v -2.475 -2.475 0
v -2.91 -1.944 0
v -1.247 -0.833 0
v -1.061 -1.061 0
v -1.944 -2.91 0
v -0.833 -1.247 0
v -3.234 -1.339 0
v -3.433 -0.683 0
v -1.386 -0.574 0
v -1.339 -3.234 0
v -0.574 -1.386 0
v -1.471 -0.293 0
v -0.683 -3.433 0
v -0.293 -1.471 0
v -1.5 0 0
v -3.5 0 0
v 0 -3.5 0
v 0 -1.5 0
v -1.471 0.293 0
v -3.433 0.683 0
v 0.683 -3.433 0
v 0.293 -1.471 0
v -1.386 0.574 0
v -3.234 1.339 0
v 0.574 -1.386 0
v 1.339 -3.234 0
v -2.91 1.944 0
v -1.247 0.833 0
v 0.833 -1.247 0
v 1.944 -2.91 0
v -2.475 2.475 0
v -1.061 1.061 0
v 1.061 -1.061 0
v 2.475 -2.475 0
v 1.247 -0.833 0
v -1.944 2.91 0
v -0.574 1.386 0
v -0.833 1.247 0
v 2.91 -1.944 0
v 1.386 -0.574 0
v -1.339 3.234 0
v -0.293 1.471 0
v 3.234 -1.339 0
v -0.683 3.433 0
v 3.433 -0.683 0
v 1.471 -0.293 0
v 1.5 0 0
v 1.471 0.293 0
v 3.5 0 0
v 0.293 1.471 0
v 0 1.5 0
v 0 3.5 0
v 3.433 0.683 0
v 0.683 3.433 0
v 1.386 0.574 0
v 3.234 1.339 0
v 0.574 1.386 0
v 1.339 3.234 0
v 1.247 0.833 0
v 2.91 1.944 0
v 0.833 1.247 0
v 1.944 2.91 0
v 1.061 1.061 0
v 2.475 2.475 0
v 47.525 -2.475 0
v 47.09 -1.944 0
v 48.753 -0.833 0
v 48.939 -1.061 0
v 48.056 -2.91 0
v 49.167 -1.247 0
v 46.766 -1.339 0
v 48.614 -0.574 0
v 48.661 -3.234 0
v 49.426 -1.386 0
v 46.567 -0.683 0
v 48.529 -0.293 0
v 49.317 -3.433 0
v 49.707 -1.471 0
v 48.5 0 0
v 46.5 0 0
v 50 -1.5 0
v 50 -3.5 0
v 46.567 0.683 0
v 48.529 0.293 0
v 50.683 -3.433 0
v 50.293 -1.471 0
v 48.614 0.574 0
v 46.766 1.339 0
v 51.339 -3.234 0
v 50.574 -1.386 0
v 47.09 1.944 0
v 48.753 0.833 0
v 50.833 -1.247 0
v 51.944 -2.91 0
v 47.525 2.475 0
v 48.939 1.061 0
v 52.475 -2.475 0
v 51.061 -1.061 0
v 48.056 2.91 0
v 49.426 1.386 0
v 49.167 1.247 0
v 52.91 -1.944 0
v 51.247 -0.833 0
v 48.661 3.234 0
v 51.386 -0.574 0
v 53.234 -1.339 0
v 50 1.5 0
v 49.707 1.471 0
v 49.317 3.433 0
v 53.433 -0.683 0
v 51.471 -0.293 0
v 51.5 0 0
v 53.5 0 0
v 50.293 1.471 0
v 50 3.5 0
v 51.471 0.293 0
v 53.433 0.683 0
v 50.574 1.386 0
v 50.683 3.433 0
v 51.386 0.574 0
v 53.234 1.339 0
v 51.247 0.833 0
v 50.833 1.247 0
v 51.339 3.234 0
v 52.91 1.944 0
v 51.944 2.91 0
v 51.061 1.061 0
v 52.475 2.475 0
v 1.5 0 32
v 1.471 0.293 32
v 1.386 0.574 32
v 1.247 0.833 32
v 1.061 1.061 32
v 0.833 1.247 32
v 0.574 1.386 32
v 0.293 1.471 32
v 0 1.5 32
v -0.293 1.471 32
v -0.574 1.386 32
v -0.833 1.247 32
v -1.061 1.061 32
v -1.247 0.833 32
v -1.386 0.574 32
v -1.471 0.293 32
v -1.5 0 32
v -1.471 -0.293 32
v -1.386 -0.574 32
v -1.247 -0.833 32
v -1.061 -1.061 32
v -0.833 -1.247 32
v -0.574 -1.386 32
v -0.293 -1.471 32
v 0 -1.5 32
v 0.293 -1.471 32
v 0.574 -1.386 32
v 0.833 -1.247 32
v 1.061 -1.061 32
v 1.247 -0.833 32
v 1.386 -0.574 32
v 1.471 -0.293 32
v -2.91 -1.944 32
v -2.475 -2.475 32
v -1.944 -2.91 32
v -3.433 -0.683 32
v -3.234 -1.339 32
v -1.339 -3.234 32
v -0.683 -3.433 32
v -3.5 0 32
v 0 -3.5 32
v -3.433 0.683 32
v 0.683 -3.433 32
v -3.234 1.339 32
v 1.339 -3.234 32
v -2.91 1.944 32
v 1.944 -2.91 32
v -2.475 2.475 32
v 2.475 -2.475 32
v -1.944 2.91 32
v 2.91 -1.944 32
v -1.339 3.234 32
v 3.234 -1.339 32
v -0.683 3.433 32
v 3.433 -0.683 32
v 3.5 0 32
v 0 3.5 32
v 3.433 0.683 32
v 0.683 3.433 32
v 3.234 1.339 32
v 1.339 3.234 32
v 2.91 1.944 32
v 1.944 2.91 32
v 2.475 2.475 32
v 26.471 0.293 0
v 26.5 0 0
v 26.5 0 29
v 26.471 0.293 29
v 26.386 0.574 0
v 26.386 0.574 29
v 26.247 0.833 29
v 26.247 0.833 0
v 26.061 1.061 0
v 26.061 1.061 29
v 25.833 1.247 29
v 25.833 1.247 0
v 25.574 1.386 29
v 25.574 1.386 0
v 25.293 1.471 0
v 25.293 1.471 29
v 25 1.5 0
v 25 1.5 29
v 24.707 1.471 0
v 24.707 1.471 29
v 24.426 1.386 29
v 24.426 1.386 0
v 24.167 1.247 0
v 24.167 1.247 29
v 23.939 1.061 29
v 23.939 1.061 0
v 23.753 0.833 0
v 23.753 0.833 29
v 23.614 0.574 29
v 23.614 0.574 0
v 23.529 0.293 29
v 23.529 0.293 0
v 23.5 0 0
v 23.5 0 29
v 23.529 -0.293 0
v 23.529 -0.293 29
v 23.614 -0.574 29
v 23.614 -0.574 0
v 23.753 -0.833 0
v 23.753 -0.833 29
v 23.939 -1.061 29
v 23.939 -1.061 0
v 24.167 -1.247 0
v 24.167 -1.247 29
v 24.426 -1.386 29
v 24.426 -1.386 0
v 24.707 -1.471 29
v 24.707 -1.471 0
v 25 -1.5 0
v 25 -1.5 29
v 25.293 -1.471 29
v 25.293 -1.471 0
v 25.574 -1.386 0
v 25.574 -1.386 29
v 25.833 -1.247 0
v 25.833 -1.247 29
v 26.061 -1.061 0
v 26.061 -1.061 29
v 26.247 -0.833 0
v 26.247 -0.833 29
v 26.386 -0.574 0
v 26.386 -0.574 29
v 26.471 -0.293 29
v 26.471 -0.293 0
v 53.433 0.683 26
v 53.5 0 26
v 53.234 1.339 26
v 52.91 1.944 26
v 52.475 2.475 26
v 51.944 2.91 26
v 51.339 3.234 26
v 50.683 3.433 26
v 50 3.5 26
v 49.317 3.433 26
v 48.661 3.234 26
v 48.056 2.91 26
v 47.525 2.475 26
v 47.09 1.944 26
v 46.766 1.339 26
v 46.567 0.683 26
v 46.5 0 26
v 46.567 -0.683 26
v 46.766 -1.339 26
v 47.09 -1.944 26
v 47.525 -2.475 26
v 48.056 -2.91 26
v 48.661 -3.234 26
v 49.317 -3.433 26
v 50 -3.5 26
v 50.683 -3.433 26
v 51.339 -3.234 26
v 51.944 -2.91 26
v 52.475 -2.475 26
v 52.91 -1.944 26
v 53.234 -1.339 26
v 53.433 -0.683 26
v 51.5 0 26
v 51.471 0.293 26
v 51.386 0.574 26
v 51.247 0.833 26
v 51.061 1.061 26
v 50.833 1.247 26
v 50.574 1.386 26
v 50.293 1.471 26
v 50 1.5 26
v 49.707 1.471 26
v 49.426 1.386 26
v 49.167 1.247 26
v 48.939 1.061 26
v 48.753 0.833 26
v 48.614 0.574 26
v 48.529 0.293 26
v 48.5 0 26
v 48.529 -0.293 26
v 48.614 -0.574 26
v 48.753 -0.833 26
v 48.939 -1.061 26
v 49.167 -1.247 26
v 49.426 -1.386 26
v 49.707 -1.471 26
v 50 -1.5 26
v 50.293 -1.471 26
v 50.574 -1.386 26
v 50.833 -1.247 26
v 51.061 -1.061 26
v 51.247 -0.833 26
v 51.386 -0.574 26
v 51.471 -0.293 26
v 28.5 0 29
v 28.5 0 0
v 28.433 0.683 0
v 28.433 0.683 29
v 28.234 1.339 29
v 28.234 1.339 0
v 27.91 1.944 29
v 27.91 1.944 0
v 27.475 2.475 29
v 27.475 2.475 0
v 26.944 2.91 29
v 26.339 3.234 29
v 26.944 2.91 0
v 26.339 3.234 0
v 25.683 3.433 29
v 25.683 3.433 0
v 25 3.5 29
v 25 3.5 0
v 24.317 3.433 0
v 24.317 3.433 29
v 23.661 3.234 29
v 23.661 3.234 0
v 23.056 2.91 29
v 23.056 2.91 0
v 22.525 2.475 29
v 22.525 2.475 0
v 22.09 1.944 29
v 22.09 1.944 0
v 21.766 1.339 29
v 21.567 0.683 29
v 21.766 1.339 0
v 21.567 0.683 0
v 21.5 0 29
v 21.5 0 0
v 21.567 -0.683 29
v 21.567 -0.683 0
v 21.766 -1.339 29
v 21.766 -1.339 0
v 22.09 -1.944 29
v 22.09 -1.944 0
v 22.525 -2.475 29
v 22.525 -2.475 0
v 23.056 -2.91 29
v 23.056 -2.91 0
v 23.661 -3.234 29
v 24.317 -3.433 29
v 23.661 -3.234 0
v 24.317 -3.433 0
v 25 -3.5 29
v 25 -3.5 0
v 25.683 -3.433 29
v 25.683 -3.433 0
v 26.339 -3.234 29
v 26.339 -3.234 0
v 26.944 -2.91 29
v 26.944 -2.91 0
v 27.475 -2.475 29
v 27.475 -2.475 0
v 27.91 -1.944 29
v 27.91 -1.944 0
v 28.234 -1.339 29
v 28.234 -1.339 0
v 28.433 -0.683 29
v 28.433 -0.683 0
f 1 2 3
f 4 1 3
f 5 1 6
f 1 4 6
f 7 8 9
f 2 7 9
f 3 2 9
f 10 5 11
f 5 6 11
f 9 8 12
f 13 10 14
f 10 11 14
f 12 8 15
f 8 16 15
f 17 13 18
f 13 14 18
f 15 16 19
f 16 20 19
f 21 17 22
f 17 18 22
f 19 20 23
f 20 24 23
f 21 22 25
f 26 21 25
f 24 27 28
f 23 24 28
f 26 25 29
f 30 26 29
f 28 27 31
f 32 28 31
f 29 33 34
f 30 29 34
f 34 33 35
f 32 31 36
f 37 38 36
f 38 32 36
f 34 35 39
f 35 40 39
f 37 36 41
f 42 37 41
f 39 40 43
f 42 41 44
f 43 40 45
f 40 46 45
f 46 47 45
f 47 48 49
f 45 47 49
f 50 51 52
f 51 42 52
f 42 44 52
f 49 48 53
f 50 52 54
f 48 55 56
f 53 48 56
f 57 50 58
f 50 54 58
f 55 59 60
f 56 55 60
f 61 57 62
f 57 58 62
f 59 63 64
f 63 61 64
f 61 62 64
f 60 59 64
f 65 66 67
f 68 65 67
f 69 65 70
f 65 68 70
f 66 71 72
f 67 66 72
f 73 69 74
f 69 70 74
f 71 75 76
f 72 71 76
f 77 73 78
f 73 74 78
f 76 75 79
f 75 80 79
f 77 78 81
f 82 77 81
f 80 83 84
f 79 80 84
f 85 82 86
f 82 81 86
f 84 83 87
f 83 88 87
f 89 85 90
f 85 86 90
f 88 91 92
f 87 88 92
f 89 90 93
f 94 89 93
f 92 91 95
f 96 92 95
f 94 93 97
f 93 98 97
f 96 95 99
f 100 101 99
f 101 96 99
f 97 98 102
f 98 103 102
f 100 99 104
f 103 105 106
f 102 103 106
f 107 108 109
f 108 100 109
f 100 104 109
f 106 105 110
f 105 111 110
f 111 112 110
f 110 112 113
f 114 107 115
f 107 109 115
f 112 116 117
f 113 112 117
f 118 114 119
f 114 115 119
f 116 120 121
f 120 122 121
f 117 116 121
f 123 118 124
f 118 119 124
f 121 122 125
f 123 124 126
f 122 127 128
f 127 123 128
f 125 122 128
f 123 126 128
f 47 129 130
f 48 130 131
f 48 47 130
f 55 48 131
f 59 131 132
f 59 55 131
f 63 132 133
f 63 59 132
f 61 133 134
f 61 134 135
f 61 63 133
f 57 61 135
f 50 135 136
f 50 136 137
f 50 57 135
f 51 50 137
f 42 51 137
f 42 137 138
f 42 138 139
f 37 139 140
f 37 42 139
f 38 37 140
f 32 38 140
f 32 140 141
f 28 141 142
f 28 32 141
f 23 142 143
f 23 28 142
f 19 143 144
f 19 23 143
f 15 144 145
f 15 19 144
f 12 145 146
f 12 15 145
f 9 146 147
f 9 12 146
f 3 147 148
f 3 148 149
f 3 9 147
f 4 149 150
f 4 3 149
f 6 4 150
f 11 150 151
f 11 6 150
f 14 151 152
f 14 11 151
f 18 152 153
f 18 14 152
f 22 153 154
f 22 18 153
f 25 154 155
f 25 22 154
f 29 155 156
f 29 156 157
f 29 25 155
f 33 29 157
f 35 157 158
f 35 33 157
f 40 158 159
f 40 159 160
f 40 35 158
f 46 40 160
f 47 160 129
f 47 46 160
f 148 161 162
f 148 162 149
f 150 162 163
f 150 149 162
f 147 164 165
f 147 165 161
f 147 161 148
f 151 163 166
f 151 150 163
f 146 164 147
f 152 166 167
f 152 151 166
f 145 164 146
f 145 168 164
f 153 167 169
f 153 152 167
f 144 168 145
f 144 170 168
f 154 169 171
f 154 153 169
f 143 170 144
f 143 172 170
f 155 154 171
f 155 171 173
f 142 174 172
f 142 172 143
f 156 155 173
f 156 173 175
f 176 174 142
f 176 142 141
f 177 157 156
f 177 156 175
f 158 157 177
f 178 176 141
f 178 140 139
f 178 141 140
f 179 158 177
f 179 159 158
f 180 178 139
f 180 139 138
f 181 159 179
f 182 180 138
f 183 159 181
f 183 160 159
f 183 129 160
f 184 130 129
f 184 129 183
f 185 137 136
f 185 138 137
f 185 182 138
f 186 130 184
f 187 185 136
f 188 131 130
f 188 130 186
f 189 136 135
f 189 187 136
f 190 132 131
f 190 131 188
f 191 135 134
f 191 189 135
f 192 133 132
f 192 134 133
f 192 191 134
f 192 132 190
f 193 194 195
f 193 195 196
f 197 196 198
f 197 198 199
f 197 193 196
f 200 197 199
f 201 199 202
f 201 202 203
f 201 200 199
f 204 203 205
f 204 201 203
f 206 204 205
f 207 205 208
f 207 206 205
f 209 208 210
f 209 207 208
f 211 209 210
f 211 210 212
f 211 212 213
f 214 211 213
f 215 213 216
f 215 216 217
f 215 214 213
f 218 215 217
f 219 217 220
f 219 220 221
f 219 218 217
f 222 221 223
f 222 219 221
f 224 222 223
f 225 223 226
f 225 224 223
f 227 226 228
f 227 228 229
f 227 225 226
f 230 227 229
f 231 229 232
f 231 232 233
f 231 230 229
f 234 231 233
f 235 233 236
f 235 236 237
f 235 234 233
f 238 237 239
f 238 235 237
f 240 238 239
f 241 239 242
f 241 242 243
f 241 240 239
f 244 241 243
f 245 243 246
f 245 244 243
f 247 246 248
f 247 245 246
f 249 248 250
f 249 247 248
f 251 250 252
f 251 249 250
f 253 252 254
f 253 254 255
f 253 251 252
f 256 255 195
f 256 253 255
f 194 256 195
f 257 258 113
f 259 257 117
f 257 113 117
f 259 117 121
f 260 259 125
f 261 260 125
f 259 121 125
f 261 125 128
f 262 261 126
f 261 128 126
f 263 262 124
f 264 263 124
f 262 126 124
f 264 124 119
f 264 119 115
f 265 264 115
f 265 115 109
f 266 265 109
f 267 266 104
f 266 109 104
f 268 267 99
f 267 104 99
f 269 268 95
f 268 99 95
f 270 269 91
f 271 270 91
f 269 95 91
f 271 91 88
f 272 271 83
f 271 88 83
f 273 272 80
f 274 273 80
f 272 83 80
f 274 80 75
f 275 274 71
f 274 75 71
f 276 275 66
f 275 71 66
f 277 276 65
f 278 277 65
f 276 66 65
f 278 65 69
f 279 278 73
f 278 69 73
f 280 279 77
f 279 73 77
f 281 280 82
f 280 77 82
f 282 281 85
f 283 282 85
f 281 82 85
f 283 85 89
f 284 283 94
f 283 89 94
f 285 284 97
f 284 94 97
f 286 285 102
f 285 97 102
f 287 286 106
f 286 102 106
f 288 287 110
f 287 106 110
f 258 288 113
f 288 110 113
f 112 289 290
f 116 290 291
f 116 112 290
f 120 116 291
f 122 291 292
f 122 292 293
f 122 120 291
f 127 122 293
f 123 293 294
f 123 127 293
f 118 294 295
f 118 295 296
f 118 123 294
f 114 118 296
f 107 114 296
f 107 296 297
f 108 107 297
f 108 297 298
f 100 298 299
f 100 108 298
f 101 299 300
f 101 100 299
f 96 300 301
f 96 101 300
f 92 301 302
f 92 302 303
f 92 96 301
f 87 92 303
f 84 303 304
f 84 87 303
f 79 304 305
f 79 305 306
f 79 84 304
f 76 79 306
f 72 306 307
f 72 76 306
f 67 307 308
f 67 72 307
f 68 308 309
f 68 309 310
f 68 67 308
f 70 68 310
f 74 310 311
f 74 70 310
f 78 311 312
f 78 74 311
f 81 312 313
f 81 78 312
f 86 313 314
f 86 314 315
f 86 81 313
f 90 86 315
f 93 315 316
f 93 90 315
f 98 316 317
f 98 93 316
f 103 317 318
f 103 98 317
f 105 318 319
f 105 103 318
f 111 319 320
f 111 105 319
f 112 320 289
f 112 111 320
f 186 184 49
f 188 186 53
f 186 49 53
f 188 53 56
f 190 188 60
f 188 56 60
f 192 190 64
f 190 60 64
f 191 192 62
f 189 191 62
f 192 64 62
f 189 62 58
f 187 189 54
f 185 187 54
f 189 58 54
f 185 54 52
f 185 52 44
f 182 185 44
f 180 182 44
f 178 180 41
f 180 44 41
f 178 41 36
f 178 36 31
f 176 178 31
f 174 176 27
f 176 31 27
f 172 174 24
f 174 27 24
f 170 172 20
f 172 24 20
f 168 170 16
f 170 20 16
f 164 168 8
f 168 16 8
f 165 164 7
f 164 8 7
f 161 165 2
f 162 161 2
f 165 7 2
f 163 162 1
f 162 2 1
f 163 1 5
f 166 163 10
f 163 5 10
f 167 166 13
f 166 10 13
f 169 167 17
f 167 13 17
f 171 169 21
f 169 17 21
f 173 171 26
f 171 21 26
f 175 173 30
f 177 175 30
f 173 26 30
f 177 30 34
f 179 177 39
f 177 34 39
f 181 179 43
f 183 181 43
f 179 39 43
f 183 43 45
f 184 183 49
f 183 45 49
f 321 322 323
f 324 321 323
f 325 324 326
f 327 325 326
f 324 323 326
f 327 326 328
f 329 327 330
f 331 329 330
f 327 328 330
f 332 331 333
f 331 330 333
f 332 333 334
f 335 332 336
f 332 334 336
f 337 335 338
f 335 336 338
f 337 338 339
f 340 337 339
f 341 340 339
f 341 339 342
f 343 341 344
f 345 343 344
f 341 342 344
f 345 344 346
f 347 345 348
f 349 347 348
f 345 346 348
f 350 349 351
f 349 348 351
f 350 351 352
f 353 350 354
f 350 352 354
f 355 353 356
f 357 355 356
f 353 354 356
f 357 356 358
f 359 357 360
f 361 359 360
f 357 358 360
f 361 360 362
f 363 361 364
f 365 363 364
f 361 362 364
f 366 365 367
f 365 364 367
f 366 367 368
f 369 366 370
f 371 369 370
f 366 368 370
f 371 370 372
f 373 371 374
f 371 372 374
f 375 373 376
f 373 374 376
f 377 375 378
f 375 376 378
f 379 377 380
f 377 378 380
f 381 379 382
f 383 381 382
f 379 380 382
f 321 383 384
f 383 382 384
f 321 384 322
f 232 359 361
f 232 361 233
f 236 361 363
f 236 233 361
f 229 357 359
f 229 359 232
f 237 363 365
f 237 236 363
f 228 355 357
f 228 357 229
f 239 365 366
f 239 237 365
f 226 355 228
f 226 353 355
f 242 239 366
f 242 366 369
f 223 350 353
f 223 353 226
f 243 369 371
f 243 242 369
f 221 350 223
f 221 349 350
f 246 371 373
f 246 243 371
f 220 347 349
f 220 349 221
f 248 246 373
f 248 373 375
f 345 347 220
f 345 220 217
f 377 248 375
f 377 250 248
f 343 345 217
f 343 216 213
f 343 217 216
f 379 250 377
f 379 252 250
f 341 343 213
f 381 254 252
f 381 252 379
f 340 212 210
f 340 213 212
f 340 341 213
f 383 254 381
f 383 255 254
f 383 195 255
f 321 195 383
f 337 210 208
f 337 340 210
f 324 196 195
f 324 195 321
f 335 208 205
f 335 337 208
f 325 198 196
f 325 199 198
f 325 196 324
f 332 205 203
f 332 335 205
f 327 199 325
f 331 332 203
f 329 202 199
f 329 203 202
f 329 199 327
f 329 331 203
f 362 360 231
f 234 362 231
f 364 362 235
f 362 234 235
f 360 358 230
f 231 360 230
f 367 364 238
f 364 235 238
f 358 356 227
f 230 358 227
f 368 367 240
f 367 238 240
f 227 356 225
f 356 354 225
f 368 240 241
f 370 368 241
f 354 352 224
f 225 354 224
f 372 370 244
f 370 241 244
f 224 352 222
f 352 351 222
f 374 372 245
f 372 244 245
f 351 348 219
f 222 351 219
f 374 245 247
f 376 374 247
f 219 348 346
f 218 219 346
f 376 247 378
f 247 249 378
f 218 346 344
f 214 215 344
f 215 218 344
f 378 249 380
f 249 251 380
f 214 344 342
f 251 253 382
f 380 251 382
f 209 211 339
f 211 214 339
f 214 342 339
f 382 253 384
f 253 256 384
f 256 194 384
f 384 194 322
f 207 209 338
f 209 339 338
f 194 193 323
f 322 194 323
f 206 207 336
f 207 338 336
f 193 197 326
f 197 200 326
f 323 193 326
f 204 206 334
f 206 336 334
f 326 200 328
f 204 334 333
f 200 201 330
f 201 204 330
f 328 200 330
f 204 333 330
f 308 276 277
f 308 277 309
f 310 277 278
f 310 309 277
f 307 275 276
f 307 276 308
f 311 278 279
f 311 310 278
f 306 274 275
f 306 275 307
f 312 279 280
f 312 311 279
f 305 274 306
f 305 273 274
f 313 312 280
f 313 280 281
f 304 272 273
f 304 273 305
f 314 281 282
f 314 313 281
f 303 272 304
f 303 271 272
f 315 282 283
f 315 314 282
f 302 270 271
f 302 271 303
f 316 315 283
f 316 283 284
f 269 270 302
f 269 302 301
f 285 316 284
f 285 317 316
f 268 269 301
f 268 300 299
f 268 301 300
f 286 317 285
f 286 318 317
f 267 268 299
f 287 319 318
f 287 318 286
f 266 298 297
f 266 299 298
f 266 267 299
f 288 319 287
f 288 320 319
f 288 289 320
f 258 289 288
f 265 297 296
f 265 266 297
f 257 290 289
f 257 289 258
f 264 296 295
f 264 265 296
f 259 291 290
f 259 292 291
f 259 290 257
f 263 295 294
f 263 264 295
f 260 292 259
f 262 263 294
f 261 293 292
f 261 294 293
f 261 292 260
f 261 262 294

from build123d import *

# Parameters (mm, degrees)
F0_R     = 3.5
F0_R_2   = 1.5
F1_DEPTH = 32
F2_DEPTH = 29
F3_DEPTH = 26


with BuildPart() as f1:
    # F0 (on Top) → F1 (new body)
    with BuildSketch(Plane.XY):
        Circle(F0_R)
        Circle(F0_R_2, mode=Mode.SUBTRACT)
    extrude(amount=F1_DEPTH)


with BuildPart() as f2:
    # F0 (on Top) → F2 (new body)
    with BuildSketch(Plane.XY):
        with Locations((25, 0)):
            Circle(F0_R)
        with Locations((25, 0)):
            Circle(F0_R_2, mode=Mode.SUBTRACT)
    extrude(amount=F2_DEPTH)


with BuildPart() as f3:
    # F0 (on Top) → F3 (new body)
    with BuildSketch(Plane.XY):
        with Locations((50, 0)):
            Circle(F0_R)
        with Locations((50, 0)):
            Circle(F0_R_2, mode=Mode.SUBTRACT)
    extrude(amount=F3_DEPTH)


solid = Compound([f1.part, f2.part, f3.part])
